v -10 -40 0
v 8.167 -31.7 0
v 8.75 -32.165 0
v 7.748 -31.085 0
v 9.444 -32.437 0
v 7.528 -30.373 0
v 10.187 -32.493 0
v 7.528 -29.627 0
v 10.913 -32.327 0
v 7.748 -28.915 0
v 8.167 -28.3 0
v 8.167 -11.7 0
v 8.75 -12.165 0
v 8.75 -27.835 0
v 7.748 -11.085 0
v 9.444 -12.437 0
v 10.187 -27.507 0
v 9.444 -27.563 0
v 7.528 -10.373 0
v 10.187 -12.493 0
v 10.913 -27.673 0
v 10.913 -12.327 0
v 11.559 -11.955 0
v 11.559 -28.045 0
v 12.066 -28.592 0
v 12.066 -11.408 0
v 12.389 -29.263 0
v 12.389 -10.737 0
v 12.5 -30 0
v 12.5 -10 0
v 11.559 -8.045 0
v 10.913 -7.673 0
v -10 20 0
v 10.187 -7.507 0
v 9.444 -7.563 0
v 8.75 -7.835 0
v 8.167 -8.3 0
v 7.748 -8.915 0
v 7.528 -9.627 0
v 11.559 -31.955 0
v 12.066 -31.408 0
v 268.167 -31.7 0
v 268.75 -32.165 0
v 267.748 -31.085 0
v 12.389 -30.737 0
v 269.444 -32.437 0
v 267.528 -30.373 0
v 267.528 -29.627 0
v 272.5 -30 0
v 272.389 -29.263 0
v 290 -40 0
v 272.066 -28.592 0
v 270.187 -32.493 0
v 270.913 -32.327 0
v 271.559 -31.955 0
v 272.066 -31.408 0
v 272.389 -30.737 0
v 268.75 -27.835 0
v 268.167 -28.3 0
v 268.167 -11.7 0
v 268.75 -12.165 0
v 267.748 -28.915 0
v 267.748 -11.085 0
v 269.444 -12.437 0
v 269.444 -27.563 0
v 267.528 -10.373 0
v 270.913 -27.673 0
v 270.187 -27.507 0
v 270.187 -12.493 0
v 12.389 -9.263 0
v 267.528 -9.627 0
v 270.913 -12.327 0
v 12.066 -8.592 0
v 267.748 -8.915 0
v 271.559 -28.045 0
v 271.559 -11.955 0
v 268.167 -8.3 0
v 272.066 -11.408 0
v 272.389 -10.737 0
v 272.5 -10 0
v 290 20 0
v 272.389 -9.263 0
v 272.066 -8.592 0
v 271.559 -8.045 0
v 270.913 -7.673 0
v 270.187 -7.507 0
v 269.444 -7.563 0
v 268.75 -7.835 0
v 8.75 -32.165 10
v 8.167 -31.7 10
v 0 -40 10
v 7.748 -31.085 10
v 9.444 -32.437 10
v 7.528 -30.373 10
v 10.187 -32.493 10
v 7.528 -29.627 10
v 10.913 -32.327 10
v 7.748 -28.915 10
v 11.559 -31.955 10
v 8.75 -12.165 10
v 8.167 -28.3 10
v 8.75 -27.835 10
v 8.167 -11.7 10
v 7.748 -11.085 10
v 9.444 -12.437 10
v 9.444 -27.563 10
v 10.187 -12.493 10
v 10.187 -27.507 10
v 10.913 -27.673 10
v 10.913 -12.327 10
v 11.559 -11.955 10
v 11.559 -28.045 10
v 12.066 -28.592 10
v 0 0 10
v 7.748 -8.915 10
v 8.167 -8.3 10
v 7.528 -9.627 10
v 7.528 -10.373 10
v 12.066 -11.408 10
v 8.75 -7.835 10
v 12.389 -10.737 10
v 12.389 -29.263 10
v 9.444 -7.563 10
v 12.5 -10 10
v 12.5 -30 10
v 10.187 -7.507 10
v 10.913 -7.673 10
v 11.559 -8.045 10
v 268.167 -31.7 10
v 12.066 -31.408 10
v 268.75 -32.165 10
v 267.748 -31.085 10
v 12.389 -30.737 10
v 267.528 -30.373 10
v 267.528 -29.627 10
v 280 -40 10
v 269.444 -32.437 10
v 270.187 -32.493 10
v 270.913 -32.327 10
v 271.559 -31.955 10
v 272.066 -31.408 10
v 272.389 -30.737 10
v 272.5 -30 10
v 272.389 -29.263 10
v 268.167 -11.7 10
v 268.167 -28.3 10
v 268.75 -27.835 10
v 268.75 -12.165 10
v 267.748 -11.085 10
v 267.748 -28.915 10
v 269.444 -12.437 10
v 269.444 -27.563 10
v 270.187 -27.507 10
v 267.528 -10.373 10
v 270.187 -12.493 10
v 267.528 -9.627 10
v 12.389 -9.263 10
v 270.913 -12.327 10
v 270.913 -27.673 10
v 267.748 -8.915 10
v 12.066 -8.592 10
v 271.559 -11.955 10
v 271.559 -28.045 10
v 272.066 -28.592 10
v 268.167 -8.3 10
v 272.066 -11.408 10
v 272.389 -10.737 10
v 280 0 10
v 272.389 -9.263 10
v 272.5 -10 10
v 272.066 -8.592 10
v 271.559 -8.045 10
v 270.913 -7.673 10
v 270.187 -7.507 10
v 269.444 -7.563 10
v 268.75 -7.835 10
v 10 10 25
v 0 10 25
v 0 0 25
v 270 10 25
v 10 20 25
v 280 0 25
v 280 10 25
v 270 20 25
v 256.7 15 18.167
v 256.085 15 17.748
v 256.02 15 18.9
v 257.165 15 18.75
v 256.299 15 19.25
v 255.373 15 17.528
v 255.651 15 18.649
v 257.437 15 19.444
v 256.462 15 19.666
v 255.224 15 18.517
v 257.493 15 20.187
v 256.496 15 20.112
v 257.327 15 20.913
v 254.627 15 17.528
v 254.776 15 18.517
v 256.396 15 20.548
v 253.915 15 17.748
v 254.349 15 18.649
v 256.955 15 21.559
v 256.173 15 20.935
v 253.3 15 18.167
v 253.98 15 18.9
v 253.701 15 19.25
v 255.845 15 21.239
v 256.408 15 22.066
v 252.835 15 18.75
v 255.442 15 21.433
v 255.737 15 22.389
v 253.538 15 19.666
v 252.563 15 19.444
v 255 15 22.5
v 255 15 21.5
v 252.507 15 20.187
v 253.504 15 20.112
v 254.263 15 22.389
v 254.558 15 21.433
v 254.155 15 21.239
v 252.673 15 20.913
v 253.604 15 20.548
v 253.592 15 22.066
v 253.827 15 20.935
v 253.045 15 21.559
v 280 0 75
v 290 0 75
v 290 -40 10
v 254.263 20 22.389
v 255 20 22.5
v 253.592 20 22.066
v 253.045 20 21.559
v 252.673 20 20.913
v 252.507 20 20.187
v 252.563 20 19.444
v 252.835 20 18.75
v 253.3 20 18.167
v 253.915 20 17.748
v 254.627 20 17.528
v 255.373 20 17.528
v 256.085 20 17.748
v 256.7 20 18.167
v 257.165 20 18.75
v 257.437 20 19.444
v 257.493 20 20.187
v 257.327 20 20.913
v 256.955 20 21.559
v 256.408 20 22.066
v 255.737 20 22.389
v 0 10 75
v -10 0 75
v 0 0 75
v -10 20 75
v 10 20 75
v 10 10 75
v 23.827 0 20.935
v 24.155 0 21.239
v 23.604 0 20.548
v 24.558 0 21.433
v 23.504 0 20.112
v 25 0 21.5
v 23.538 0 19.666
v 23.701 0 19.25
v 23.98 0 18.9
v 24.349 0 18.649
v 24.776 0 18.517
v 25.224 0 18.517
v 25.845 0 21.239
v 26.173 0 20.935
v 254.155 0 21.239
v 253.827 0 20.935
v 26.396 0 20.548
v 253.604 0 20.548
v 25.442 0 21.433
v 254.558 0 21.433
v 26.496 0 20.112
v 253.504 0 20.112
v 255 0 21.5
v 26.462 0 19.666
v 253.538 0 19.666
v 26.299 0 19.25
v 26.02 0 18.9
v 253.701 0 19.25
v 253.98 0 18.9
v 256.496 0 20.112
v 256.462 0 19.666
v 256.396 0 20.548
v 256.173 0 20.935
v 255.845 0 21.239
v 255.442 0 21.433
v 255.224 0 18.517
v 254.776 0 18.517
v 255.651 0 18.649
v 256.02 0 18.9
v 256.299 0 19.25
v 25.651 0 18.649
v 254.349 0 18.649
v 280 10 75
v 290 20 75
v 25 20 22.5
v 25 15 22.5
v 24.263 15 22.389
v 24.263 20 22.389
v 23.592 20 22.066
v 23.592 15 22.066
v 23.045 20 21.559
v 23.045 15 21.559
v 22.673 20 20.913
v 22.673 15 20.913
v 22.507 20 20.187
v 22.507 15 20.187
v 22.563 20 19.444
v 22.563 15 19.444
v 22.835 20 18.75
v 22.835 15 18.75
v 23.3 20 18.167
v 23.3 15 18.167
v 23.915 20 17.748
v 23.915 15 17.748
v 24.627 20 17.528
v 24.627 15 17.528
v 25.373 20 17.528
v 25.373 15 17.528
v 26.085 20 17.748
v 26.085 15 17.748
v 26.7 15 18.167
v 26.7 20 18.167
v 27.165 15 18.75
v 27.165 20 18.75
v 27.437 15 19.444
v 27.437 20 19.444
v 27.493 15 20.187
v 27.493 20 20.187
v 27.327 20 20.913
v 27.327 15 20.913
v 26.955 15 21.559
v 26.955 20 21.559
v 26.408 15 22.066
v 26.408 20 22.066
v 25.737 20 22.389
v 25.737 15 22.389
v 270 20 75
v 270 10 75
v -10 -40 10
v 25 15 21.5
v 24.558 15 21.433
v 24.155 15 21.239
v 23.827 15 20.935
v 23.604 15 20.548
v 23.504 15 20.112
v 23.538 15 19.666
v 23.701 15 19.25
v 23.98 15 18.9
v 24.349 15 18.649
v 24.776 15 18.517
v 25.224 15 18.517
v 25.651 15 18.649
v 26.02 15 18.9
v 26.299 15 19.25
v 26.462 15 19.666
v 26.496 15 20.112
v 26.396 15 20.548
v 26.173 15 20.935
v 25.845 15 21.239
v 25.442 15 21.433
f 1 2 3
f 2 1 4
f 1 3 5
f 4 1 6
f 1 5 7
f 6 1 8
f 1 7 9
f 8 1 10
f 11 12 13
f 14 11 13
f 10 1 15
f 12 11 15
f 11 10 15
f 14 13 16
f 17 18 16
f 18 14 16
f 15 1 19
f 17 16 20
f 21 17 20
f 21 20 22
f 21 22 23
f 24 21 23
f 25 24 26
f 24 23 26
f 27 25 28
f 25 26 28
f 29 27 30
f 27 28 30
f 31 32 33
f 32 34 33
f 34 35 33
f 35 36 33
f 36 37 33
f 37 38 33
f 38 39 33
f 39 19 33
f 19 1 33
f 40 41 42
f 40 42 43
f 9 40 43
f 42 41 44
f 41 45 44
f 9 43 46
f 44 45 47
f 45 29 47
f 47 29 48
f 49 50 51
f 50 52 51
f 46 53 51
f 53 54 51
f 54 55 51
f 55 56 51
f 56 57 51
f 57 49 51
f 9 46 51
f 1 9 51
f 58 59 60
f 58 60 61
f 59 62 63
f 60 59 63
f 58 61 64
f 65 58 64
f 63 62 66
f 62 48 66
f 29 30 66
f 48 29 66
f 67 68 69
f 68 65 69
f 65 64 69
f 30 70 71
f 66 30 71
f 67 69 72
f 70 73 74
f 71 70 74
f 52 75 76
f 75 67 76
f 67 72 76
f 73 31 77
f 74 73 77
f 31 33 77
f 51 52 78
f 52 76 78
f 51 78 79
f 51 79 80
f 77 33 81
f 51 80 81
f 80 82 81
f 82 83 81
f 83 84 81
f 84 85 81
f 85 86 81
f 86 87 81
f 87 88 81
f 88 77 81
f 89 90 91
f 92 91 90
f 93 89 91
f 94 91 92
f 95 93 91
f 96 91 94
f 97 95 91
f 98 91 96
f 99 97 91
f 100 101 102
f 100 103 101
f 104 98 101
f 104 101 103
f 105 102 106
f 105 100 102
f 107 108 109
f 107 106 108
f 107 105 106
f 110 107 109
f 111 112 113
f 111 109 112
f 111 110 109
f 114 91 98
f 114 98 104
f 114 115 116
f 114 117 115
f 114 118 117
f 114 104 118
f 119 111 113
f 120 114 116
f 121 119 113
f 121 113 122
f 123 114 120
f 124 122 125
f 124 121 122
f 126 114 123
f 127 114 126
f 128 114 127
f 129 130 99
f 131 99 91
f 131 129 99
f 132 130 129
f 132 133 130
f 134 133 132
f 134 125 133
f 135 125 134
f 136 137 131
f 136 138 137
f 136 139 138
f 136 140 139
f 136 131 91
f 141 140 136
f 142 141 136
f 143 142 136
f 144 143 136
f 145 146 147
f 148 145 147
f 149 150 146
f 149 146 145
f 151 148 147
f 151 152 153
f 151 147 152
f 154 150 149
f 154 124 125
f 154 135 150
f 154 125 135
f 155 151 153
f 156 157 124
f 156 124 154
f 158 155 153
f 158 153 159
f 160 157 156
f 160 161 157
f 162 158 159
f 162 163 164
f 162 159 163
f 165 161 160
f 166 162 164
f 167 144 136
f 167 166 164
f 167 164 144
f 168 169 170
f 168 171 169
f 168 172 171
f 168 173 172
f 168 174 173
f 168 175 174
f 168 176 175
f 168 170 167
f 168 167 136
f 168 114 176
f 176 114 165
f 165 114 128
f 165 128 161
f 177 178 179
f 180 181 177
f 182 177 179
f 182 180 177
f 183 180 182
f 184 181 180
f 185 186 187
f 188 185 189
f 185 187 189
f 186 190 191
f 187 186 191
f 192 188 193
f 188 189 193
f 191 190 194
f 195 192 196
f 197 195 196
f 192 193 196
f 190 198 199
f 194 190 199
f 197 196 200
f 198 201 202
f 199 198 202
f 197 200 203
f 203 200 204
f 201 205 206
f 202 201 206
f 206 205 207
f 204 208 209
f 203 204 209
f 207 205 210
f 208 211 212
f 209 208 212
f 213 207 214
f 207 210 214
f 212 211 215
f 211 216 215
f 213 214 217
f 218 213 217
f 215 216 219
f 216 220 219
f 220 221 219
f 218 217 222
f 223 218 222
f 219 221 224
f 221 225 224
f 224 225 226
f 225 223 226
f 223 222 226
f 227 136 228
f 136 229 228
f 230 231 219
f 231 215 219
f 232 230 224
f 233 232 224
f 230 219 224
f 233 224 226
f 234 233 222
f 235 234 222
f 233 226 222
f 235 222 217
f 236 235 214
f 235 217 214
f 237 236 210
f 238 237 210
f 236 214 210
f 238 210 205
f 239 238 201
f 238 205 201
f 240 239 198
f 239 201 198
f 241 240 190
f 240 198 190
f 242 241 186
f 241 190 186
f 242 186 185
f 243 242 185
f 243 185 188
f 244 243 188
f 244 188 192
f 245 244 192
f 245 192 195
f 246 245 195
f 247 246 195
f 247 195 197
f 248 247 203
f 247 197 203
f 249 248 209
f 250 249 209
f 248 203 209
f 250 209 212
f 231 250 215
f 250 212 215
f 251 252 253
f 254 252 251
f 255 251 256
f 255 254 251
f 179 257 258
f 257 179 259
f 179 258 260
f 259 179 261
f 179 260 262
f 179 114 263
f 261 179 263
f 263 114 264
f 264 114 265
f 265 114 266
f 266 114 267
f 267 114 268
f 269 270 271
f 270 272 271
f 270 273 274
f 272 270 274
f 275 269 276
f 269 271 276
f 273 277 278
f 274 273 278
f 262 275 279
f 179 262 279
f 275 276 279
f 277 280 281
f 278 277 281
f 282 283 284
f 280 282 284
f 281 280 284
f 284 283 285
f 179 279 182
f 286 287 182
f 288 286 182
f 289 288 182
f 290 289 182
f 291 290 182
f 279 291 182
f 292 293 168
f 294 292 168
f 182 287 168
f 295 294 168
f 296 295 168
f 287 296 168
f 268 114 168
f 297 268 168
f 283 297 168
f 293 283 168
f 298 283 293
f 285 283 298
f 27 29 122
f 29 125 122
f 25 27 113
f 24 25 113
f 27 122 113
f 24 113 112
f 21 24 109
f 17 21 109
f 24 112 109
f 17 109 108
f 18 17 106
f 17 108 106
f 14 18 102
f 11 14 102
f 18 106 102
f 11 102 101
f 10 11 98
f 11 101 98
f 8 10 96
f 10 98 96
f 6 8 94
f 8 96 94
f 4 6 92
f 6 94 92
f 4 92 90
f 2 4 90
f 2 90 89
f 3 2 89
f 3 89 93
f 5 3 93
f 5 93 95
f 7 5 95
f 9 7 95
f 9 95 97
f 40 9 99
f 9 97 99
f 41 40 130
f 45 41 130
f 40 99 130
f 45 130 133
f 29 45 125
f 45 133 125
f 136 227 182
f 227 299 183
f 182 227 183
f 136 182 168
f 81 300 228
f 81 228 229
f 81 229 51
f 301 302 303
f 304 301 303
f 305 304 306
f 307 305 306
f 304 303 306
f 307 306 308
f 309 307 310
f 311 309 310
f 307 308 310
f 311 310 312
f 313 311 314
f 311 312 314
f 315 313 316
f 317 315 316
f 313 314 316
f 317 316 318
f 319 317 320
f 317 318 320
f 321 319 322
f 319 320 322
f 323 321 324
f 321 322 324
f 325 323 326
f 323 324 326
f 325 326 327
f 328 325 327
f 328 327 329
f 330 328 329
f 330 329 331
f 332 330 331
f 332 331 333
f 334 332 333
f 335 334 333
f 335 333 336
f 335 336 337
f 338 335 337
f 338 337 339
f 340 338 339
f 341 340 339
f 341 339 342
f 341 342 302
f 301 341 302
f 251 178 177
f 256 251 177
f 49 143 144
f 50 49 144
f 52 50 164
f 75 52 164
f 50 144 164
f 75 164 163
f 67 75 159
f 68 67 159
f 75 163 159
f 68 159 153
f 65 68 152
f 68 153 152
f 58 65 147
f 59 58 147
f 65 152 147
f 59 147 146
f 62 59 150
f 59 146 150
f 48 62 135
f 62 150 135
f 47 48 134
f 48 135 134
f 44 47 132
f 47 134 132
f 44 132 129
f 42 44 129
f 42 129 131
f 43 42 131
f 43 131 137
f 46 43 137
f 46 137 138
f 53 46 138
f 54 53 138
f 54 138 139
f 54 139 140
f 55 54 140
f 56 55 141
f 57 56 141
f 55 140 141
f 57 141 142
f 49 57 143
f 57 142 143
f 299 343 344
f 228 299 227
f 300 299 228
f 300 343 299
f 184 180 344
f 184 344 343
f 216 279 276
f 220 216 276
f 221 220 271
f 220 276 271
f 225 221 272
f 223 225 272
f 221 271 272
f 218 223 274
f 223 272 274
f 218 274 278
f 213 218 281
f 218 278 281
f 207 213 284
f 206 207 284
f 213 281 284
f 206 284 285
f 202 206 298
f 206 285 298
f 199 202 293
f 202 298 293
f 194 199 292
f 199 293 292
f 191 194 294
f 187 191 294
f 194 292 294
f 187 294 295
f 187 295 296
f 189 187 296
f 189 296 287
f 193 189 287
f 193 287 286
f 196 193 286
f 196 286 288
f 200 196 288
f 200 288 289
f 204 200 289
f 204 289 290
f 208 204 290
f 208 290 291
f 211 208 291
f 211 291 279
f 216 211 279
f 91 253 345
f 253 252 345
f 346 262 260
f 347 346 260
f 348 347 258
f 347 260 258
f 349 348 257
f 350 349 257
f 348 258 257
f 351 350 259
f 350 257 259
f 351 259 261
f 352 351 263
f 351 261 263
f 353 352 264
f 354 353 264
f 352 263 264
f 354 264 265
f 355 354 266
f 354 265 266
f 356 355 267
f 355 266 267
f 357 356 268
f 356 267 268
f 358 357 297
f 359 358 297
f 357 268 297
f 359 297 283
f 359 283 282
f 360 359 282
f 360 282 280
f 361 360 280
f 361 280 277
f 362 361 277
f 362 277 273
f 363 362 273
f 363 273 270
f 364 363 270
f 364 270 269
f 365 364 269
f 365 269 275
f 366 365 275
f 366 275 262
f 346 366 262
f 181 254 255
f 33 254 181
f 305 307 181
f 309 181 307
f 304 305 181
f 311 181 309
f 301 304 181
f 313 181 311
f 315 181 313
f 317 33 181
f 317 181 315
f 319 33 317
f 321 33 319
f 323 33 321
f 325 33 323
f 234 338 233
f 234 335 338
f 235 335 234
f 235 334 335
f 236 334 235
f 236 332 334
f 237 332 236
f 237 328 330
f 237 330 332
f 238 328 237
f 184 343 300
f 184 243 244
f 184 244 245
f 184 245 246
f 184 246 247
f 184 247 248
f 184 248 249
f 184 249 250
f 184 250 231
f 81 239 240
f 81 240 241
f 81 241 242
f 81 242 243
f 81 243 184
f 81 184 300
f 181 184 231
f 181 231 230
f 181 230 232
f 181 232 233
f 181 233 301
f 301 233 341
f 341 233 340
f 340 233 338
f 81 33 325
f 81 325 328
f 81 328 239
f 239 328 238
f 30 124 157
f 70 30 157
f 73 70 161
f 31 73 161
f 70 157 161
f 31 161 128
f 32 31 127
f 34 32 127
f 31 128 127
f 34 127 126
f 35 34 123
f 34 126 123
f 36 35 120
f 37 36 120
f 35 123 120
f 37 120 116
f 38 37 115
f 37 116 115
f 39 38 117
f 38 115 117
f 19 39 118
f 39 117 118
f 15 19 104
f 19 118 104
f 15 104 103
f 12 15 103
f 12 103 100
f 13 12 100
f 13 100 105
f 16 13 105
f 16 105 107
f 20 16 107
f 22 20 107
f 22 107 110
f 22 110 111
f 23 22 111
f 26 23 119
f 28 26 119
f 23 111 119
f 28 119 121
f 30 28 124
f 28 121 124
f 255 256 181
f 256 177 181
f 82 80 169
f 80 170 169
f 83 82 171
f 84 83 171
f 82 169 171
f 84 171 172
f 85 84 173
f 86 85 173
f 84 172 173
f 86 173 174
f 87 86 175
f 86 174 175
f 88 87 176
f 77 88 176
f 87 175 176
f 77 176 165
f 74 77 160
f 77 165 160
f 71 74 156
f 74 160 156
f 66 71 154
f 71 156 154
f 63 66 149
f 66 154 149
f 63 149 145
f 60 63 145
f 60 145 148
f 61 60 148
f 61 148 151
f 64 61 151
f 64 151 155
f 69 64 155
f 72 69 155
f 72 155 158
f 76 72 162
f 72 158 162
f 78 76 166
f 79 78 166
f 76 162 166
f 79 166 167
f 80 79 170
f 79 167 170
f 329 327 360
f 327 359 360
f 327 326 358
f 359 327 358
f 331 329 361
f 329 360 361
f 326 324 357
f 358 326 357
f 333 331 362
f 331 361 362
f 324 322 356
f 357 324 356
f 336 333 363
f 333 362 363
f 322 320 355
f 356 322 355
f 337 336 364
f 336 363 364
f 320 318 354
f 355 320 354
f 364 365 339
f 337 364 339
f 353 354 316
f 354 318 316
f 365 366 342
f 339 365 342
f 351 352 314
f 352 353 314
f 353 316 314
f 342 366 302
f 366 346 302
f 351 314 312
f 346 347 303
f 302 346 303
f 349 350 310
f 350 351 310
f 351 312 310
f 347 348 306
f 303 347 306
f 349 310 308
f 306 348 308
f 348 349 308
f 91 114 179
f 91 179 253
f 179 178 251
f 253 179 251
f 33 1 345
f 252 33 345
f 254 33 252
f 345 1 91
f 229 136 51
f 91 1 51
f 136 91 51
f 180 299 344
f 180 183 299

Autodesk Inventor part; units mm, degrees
ref_plane "YZ Plane" through (0, 0, 0) normal (1, 0, 0) x (0, 1, 0)
ref_plane "XZ Plane" through (0, 0, 0) normal (0, 1, 0) x (-1, 0, 0)
sketch "스케치1" plane through (0, 0, 0) normal (0, 0, 1) x (1, 0, 0)
  line L0 (0, 10) -> (0, 0)
  line L1 (-10, 10) -> (-10, 20)
  line L2 (-10, 20) -> (290, 20)
  line L3 (290, 20) -> (290, 10)
  line L4 (0, 0) -> (280, 0)
  line L5 (290, 10) -> (290, -40)
  line L6 (-10, 10) -> (-10, -40)
  line L7 (-10, -40) -> (290, -40)
  line L8 (0, 10) -> (10, 10)
  line L9 (10, 10) -> (10, 20)
  line L10 (140, 20) -> (140, 10)
  line L11 (0, 0) -> (-10, 0)
  line L12 (280, 10) -> (280, 0)
  line L13 (280, 10) -> (270, 10)
  line L14 (270, 10) -> (270, 20)
  line L15 (280, 0) -> (290, 0)
  point P0 (140, 0)
  dimension "d2" = 10
  dimension "d5" = 10
  dimension "d6" = 300
  dimension "d9" = 60
  dimension "d12" = 10
  dimension "d13" = 10
extrude "돌출1" add sketch "스케치1" along normal blind 25 contours L8 L9 L2 L14 L13 L12 L4 L0 | L0 L11 L6 L1 L2 L9 L8 | L12 L13 L14 L2 L3 L5 L15
extrude "돌출2" add sketch "스케치1" along normal blind 10 contours L8 L9 L2 L14 L13 L12 L4 L0 | L4 L15 L5 L7 L6 L11
extrude "돌출3" add sketch "스케치1" along normal blind 75 contours L0 L11 L6 L1 L2 L9 L8 | L12 L13 L14 L2 L3 L5 L15
sketch "스케치2" plane through (-10, -40, 0) normal (-1, 0, 0) x (0, 0, 1)
  line L0 (0, 60) -> (0, 0) projected
  line L1 (0, 0) -> (10, 0) projected
  line L2 (10, 40) -> (10, 0) projected
  line L3 (10, 40) -> (75, 40) projected
  line L4 (75, 60) -> (75, 40) projected
  line L5 (0, 60) -> (75, 60) projected
  line L6 (75, 40) -> (10, 0)
  point P0 (0, 40)
extrude "돌출4" add sketch "스케치2" against normal up to surface (10 mm away) contours L2 L3 L6
ref_plane "작업 평면1" through (140, -40, 0) normal (1, 0, 0) x (0, 0, -1)
mirror "미러1" about plane through (140, -40, 0) normal (1, 0, 0) of "돌출4"
sketch "스케치3" plane through (0, 0, 10) normal (0, 0, 1) x (1, 0, 0)
  circle A0 centre (10, -10) radius 2.5
  circle A1 centre (270, -10) radius 2.5
  line L0 (270, 20) -> (10, 20) projected
  line L1 (290, -40) -> (290, 0) projected
  line L2 (-10, -40) -> (-10, 0) projected
  circle A2 centre (10, -30) radius 2.5
  circle A3 centre (270, -30) radius 2.5
  point P0 (0, 0)
  dimension "d18" = 30
  dimension "d19" = 5
  dimension "d20" = 20
  dimension "d21" = 20
  dimension "d24" = 5
  dimension "d25" = 20
extrude "돌출5" cut sketch "스케치3" against normal through all
sketch "스케치4" plane through (-10, 20, 0) normal (0, 1, 0) x (1, 0, 0)
  line L0 (280, -25) -> (280, -75) projected
  line L1 (20, -25) -> (20, -75) projected
  line L2 (280, -25) -> (20, -25) projected
  point P0 (10, 0)
  point P1 (35, -20)
  point P2 (265, -20)
  dimension "d26" = 15
  dimension "d27" = 15
  dimension "d28" = 5
hole "구멍1" at (25, 20, 20) at (255, 20, 20) direction (0, -1, 0) diameter 3 end through all counterbore diameter 5 counterbore depth 5
properties part number "ModuleConnector"
